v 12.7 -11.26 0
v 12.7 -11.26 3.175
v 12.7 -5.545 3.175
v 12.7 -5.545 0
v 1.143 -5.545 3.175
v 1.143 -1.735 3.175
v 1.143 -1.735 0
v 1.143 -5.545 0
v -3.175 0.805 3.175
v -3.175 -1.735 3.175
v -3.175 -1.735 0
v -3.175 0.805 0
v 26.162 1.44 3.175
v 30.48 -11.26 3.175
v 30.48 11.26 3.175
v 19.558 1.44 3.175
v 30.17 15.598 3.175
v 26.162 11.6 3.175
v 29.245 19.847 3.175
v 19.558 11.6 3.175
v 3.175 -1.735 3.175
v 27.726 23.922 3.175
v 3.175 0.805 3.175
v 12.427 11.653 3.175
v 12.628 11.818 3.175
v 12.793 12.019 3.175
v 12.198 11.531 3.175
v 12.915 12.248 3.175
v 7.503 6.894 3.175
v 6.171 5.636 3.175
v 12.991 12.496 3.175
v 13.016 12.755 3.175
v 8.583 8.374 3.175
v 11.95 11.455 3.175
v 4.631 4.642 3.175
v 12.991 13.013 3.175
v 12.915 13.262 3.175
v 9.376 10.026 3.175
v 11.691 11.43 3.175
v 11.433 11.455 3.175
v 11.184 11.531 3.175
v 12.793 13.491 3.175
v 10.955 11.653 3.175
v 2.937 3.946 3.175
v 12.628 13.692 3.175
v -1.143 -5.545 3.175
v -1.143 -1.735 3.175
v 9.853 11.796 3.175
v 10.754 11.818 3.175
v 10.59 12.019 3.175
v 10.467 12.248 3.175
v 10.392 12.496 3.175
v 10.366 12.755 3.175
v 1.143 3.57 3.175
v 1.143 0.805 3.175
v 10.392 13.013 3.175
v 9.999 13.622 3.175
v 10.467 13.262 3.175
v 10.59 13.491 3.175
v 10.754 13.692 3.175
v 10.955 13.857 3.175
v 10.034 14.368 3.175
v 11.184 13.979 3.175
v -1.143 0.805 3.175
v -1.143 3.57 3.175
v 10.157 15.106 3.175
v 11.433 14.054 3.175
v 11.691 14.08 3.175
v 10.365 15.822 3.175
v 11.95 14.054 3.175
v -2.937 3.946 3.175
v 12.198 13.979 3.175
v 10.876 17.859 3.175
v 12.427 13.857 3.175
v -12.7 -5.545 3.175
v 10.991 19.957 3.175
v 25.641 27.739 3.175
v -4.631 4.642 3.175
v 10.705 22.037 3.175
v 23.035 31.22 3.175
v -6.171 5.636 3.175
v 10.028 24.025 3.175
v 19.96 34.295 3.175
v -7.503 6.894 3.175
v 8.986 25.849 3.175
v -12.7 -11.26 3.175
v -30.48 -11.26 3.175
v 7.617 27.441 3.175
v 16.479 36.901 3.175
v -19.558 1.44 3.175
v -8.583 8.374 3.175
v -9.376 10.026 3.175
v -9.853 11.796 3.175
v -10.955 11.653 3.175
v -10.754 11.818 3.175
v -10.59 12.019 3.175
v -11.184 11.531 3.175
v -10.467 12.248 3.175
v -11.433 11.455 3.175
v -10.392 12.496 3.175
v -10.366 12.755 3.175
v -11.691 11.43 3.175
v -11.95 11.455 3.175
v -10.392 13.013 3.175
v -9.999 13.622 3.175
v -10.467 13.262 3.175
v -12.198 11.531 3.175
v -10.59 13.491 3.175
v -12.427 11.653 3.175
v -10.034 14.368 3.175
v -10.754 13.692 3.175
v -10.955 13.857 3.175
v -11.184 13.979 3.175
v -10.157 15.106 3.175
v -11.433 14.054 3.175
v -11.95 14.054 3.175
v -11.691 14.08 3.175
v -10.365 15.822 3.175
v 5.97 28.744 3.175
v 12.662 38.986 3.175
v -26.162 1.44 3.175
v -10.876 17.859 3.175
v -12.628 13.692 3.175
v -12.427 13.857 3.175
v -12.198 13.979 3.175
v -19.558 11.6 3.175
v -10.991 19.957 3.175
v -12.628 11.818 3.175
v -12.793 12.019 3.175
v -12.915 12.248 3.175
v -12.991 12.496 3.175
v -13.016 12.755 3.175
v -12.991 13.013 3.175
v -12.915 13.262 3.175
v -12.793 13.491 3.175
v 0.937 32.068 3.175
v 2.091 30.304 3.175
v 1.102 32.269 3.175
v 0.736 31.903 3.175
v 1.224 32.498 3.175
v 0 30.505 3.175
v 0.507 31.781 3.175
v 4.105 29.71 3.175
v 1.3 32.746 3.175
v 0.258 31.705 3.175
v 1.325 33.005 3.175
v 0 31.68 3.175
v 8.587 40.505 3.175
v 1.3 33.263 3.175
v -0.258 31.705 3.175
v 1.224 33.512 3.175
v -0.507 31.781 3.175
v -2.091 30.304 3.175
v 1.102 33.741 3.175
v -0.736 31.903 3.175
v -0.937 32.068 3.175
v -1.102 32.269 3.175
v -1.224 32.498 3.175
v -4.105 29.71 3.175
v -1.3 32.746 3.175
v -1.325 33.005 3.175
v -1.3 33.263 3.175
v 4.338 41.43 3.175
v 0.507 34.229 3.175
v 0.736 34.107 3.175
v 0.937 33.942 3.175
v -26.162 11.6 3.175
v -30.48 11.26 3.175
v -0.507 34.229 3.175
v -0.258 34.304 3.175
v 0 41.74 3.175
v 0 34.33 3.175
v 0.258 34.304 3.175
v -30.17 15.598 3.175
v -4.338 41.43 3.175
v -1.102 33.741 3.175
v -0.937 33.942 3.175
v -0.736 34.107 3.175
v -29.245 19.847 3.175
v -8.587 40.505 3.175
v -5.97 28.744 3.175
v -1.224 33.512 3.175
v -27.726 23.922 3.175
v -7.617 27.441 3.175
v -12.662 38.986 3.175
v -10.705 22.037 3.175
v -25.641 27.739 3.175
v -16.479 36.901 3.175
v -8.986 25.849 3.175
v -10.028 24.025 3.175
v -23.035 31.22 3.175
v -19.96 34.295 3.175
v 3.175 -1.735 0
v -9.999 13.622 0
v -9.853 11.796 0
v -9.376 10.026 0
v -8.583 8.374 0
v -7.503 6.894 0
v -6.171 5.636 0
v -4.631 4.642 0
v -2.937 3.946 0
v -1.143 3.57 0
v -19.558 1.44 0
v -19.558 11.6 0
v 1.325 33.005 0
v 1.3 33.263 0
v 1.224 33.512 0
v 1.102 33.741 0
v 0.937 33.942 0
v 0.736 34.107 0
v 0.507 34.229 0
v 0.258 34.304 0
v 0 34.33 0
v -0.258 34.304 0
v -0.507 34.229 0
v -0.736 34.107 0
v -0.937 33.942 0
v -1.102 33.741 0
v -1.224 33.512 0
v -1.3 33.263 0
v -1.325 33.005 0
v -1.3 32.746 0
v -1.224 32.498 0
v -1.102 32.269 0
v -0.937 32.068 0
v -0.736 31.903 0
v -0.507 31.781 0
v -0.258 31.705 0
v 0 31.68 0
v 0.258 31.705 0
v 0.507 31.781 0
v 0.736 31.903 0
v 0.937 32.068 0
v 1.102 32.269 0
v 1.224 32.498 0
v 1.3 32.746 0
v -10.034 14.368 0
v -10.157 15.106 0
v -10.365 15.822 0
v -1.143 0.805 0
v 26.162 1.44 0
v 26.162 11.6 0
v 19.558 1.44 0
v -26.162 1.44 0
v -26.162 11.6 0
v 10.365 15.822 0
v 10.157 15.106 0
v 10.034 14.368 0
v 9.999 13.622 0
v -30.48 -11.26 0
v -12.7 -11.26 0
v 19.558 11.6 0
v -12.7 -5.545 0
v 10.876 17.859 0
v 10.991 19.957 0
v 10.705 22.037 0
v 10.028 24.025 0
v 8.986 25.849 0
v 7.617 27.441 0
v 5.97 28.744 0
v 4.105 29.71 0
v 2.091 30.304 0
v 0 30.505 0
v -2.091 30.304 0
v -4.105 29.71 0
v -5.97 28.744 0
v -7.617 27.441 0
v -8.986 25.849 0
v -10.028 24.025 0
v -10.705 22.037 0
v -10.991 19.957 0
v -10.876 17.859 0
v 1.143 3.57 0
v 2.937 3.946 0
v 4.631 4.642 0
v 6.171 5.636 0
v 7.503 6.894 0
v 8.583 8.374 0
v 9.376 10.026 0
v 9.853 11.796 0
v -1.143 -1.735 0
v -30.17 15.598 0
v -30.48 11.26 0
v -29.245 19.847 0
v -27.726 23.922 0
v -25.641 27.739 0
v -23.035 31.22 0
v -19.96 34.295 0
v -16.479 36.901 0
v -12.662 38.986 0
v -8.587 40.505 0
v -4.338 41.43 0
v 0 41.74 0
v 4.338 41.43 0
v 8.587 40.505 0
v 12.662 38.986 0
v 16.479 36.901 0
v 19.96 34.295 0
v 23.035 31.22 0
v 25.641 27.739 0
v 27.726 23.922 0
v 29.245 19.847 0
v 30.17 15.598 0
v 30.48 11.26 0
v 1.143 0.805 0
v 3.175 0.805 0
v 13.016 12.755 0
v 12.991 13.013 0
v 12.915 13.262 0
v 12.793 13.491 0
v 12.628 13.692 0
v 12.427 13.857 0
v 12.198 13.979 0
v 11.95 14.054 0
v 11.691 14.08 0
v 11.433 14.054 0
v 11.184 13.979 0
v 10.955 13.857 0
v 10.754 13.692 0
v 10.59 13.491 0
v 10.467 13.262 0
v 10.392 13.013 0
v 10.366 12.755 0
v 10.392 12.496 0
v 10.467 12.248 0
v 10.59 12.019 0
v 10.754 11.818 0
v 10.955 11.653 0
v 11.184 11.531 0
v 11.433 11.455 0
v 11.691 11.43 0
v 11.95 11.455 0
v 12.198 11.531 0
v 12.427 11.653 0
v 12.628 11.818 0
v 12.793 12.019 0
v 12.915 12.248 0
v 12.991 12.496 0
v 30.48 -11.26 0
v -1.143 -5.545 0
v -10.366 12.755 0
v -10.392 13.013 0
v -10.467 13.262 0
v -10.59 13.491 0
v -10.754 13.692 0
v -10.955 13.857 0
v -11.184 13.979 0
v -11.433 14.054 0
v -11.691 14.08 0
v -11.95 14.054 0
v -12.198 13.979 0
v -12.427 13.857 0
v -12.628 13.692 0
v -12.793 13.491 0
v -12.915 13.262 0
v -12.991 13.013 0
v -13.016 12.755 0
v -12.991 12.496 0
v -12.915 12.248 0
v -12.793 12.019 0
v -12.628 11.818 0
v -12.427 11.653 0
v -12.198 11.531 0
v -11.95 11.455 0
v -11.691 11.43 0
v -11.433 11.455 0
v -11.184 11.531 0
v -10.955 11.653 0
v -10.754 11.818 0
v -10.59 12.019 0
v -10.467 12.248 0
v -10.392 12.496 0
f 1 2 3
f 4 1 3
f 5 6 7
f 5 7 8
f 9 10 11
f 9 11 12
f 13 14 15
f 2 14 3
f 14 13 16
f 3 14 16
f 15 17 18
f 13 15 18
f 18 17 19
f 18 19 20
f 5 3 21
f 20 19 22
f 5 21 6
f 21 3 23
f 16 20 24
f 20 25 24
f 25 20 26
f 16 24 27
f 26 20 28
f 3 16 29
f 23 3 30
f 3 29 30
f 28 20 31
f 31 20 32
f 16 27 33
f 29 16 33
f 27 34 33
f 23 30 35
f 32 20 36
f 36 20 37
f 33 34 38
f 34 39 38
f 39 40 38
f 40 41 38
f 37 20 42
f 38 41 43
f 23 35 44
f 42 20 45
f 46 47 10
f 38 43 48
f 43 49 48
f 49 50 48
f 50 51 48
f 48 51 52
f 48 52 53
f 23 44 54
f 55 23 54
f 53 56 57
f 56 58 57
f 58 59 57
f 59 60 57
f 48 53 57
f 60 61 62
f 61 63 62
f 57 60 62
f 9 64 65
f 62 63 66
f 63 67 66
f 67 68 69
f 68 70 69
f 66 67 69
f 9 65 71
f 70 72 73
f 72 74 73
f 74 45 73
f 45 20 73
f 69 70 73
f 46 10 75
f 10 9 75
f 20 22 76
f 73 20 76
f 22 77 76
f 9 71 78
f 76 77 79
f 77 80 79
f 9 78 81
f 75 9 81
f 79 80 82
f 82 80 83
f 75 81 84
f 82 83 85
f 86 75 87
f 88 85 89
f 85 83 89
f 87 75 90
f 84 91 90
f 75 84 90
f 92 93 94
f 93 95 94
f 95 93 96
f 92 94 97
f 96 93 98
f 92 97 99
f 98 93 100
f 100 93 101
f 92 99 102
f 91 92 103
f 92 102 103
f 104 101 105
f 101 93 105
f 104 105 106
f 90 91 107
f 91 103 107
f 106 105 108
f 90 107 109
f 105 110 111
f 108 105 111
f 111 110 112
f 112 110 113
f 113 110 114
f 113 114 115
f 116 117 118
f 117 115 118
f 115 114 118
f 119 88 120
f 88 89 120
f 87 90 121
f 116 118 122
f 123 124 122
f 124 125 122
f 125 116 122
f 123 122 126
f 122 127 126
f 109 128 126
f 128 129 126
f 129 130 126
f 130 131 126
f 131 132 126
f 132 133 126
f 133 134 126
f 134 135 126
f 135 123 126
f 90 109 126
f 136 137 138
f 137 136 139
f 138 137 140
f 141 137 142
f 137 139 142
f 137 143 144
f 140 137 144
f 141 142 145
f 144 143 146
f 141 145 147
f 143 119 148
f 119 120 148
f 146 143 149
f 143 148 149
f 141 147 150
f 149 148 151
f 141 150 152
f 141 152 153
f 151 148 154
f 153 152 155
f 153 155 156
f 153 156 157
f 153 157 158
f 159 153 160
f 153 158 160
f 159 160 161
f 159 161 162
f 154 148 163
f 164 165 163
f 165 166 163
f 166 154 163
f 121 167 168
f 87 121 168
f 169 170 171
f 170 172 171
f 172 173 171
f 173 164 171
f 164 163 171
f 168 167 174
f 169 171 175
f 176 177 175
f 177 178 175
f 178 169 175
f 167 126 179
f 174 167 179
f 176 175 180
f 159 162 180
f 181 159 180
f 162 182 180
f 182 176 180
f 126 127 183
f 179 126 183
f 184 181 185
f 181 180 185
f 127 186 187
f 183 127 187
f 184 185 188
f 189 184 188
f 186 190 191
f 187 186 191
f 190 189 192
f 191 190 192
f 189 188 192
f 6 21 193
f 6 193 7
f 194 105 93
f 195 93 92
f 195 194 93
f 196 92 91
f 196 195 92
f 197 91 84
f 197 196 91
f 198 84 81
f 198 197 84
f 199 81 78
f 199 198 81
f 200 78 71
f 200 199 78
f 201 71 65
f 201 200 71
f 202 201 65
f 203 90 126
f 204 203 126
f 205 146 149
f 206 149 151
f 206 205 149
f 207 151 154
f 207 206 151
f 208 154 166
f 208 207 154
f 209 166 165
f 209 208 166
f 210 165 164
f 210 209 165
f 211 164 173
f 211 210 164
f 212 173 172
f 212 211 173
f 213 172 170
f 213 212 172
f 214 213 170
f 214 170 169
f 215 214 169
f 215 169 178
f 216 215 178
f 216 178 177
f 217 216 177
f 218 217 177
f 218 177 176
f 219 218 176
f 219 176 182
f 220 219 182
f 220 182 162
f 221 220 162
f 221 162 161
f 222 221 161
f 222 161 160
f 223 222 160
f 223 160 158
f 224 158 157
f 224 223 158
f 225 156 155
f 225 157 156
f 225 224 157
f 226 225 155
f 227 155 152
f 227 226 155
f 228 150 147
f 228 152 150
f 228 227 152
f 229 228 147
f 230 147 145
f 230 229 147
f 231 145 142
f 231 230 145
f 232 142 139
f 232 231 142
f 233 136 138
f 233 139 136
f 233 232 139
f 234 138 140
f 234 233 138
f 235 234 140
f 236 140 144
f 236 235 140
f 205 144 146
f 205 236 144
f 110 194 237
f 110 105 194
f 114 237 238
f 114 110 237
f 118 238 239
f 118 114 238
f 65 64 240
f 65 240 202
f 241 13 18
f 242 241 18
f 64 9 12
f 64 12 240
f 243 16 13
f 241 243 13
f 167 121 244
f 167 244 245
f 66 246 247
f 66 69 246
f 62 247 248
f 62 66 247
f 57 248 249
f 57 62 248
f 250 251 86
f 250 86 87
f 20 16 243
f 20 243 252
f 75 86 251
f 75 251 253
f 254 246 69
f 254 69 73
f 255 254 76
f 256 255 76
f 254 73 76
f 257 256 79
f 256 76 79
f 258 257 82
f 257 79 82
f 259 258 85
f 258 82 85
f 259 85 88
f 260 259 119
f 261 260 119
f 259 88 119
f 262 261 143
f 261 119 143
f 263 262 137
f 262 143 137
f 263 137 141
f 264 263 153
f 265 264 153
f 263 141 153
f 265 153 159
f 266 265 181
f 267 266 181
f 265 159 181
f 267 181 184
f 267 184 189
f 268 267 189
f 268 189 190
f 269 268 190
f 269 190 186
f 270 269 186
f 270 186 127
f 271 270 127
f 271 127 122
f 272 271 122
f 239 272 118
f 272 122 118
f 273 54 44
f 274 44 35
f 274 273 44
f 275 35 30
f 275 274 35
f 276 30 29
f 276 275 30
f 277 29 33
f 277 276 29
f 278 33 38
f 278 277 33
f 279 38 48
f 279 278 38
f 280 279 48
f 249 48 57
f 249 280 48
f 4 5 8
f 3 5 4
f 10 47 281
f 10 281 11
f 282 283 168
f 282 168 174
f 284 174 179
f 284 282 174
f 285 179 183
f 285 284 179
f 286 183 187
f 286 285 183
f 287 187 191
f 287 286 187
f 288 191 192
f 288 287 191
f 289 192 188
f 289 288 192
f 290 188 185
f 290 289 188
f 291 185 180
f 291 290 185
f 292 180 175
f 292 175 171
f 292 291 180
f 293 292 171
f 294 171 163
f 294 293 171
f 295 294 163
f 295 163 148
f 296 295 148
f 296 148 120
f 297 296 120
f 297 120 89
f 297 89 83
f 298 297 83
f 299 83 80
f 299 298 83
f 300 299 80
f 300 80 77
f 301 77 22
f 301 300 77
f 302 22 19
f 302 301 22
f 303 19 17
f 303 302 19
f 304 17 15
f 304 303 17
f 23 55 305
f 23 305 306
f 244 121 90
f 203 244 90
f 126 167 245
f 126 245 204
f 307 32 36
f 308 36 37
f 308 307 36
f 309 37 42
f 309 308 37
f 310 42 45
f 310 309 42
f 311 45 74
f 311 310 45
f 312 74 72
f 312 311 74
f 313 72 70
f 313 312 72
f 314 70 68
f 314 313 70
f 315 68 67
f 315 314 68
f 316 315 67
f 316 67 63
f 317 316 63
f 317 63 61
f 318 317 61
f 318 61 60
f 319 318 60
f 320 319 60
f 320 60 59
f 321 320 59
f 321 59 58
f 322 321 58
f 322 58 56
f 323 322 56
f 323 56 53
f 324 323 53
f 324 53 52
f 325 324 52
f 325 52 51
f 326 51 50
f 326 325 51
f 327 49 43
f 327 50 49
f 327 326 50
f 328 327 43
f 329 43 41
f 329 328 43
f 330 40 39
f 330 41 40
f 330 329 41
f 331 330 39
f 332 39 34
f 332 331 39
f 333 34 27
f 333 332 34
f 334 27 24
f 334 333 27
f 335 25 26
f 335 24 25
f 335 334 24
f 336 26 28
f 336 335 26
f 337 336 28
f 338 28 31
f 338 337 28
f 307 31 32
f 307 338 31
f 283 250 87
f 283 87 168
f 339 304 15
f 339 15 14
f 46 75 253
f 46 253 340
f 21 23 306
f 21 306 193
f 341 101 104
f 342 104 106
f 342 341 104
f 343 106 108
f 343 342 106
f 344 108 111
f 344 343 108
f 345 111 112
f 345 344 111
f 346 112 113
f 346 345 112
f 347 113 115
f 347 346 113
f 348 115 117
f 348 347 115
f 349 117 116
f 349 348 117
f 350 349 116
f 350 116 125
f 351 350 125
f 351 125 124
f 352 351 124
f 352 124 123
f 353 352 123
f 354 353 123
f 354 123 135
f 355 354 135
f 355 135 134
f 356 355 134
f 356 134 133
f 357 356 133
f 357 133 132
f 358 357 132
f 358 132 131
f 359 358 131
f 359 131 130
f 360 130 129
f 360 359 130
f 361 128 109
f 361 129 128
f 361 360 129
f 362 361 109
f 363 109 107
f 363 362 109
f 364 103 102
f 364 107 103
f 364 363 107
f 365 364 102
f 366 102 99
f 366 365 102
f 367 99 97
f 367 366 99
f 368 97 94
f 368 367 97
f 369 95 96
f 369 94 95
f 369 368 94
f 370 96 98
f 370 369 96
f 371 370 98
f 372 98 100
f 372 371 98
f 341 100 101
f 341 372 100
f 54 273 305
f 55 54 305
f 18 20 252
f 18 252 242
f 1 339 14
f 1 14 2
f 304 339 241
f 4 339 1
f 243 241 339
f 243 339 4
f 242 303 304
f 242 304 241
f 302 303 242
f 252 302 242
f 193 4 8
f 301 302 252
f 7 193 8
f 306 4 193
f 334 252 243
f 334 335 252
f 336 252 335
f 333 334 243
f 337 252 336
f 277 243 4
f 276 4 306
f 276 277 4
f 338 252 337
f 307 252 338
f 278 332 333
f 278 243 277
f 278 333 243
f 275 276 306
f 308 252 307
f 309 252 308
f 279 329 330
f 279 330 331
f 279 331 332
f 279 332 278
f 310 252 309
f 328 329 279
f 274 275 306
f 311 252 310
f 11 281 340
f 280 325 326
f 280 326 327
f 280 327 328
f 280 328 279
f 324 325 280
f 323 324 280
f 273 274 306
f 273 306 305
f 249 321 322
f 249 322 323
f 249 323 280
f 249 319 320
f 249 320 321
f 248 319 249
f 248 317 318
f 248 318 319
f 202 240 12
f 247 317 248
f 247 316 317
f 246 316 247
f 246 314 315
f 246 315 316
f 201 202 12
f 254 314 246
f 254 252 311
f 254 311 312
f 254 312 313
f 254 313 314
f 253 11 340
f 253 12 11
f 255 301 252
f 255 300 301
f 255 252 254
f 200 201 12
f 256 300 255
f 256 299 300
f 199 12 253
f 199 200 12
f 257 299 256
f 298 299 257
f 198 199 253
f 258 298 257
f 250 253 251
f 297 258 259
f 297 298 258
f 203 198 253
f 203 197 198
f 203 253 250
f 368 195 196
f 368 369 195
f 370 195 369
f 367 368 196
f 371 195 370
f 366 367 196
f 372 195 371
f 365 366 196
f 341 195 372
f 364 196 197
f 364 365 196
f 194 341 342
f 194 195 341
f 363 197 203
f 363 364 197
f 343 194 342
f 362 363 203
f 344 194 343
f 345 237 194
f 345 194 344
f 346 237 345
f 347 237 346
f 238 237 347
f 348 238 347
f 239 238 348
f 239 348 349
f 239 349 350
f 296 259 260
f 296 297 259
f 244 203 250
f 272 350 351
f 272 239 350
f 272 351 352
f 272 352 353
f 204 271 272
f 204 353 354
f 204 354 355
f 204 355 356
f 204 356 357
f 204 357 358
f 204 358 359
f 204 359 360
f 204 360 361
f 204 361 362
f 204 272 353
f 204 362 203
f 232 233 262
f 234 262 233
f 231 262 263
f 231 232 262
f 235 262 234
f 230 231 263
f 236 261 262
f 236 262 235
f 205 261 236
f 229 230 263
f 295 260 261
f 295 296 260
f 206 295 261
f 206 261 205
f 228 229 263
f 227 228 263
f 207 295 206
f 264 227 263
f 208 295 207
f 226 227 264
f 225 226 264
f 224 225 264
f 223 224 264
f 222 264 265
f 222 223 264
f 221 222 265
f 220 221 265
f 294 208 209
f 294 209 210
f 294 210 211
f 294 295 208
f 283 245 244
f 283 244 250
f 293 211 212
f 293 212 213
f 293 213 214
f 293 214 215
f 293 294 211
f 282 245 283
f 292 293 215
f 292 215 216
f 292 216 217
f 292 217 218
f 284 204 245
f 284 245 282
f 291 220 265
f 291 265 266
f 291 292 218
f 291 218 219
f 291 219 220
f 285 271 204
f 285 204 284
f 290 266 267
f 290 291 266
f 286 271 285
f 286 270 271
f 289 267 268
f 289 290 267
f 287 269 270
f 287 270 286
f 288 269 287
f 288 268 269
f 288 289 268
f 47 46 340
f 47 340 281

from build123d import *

# Parameters (mm, degrees)
BOSS_EXTRUDE1_DEPTH = 3.175
CUT_EXTRUDE1_REACH  = 53.782
SKETCH2_R           = 11
CUT_EXTRUDE2_REACH  = 53.782
SKETCH3_W           = 25.4
SKETCH3_H           = 5.715
CUT_EXTRUDE4_REACH  = 53.782
SKETCH6_R           = 1.3250037
CUT_EXTRUDE6_DEPTH  = 52.781708168
SKETCH7_R           = 10
CUT_EXTRUDE7_DEPTH  = 52.781708168
FILLET1_R           = 6.35
CUT_EXTRUDE8_REACH  = 53.782
SKETCH8_W           = 6.604
SKETCH8_H           = 10.16


with BuildPart() as part:
    # Sketch1 → Boss-Extrude1 (new body)
    with BuildSketch(Plane.XY):
        with BuildLine():
            Line((30.48, -11.260079969), (-30.48, -11.260079969))
            Line((-30.48, -11.260079969), (-30.48, 11.260079969))
            ThreePointArc((-30.48, 11.260079969), (0, 41.740079969), (30.48, 11.260079969))
            Line((30.48, 11.260079969), (30.48, -11.260079969))
        make_face()
    extrude(amount=BOSS_EXTRUDE1_DEPTH)

    # Sketch2 → Cut-Extrude1 (cut, up to next)
    with BuildSketch(Plane.XY.offset(3.175), mode=Mode.PRIVATE) as cut_extrude1_sk1:
        with Locations((0, 19.504919969)):
            Circle(SKETCH2_R)
    cut_extrude1_tool1 = extrude(cut_extrude1_sk1.sketch, amount=-CUT_EXTRUDE1_REACH, mode=Mode.PRIVATE) & part.part
    add(cut_extrude1_tool1.solids().sort_by_distance((0, 19.50492, 3.175))[0], mode=Mode.SUBTRACT)

    # Sketch3 → Cut-Extrude2 (cut, up to next)
    with BuildSketch(Plane.XY.offset(3.175), mode=Mode.PRIVATE) as cut_extrude2_sk1:
        with Locations((0, -8.402579969)):
            Rectangle(SKETCH3_W, SKETCH3_H)
    cut_extrude2_tool1 = extrude(cut_extrude2_sk1.sketch, amount=-CUT_EXTRUDE2_REACH, mode=Mode.PRIVATE) & part.part
    add(cut_extrude2_tool1.solids().sort_by_distance((0, -8.40258, 3.175))[0], mode=Mode.SUBTRACT)

    # Sketch5 → Cut-Extrude4 (cut, up to next)
    with BuildSketch(Plane.XY.offset(3.175), mode=Mode.PRIVATE) as cut_extrude4_sk1:
        Polygon((3.175, -1.735079969), (1.143, -1.735079969), (1.143, -5.545079969), (-1.143, -5.545079969), (-1.143, -1.735079969), (-3.175, -1.735079969), (-3.175, 0.804920031), (-1.143, 0.804920031), (-1.143, 9.694920031), (1.143, 9.694920031), (1.143, 0.804920031), (3.175, 0.804920031), align=None)
    cut_extrude4_tool1 = extrude(cut_extrude4_sk1.sketch, amount=-CUT_EXTRUDE4_REACH, mode=Mode.PRIVATE) & part.part
    add(cut_extrude4_tool1.solids().sort_by_distance((0, 1.494349, 3.175))[0], mode=Mode.SUBTRACT)

    # Sketch6 → Cut-Extrude6 (cut, through all)
    with BuildSketch(Plane.XY):
        with Locations((0, 33.004919969)):
            Circle(SKETCH6_R)
        with Locations((11.691342951, 12.754919969)):
            Circle(SKETCH6_R)
        with Locations((-11.691342951, 12.754919969)):
            Circle(SKETCH6_R)
    extrude(amount=CUT_EXTRUDE6_DEPTH, mode=Mode.SUBTRACT)

    # Sketch7 → Cut-Extrude7 (cut, through all)
    with BuildSketch(Plane.XY):
        with Locations((0, 13.504920031)):
            Circle(SKETCH7_R)
    extrude(amount=CUT_EXTRUDE7_DEPTH, mode=Mode.SUBTRACT)

    # Fillet1
    fillet1_edges = [part.edges().sort_by_distance(p)[0] for p in [
        (9.921567423, 14.754919982, 1.5875),
        (-9.921567423, 14.754919982, 1.5875),
    ]]
    fillet(fillet1_edges, radius=FILLET1_R)

    # Sketch8 → Cut-Extrude8 (cut, up to next)
    with BuildSketch(Plane.XY.offset(3.175), mode=Mode.PRIVATE) as cut_extrude8_sk1:
        with Locations((22.86, 6.519920031)):
            Rectangle(SKETCH8_W, SKETCH8_H)
    cut_extrude8_tool1 = extrude(cut_extrude8_sk1.sketch, amount=-CUT_EXTRUDE8_REACH, mode=Mode.PRIVATE) & part.part
    # Sketch8 → Cut-Extrude8 (cut, up to next)
    with BuildSketch(Plane.XY.offset(3.175), mode=Mode.PRIVATE) as cut_extrude8_sk2:
        with Locations((-22.86, 6.519920031)):
            Rectangle(SKETCH8_W, SKETCH8_H)
    cut_extrude8_tool2 = extrude(cut_extrude8_sk2.sketch, amount=-CUT_EXTRUDE8_REACH, mode=Mode.PRIVATE) & part.part
    add(cut_extrude8_tool1.solids().sort_by_distance((22.86, 6.51992, 3.175))[0], mode=Mode.SUBTRACT)
    add(cut_extrude8_tool2.solids().sort_by_distance((-22.86, 6.51992, 3.175))[0], mode=Mode.SUBTRACT)


solid = part.part
